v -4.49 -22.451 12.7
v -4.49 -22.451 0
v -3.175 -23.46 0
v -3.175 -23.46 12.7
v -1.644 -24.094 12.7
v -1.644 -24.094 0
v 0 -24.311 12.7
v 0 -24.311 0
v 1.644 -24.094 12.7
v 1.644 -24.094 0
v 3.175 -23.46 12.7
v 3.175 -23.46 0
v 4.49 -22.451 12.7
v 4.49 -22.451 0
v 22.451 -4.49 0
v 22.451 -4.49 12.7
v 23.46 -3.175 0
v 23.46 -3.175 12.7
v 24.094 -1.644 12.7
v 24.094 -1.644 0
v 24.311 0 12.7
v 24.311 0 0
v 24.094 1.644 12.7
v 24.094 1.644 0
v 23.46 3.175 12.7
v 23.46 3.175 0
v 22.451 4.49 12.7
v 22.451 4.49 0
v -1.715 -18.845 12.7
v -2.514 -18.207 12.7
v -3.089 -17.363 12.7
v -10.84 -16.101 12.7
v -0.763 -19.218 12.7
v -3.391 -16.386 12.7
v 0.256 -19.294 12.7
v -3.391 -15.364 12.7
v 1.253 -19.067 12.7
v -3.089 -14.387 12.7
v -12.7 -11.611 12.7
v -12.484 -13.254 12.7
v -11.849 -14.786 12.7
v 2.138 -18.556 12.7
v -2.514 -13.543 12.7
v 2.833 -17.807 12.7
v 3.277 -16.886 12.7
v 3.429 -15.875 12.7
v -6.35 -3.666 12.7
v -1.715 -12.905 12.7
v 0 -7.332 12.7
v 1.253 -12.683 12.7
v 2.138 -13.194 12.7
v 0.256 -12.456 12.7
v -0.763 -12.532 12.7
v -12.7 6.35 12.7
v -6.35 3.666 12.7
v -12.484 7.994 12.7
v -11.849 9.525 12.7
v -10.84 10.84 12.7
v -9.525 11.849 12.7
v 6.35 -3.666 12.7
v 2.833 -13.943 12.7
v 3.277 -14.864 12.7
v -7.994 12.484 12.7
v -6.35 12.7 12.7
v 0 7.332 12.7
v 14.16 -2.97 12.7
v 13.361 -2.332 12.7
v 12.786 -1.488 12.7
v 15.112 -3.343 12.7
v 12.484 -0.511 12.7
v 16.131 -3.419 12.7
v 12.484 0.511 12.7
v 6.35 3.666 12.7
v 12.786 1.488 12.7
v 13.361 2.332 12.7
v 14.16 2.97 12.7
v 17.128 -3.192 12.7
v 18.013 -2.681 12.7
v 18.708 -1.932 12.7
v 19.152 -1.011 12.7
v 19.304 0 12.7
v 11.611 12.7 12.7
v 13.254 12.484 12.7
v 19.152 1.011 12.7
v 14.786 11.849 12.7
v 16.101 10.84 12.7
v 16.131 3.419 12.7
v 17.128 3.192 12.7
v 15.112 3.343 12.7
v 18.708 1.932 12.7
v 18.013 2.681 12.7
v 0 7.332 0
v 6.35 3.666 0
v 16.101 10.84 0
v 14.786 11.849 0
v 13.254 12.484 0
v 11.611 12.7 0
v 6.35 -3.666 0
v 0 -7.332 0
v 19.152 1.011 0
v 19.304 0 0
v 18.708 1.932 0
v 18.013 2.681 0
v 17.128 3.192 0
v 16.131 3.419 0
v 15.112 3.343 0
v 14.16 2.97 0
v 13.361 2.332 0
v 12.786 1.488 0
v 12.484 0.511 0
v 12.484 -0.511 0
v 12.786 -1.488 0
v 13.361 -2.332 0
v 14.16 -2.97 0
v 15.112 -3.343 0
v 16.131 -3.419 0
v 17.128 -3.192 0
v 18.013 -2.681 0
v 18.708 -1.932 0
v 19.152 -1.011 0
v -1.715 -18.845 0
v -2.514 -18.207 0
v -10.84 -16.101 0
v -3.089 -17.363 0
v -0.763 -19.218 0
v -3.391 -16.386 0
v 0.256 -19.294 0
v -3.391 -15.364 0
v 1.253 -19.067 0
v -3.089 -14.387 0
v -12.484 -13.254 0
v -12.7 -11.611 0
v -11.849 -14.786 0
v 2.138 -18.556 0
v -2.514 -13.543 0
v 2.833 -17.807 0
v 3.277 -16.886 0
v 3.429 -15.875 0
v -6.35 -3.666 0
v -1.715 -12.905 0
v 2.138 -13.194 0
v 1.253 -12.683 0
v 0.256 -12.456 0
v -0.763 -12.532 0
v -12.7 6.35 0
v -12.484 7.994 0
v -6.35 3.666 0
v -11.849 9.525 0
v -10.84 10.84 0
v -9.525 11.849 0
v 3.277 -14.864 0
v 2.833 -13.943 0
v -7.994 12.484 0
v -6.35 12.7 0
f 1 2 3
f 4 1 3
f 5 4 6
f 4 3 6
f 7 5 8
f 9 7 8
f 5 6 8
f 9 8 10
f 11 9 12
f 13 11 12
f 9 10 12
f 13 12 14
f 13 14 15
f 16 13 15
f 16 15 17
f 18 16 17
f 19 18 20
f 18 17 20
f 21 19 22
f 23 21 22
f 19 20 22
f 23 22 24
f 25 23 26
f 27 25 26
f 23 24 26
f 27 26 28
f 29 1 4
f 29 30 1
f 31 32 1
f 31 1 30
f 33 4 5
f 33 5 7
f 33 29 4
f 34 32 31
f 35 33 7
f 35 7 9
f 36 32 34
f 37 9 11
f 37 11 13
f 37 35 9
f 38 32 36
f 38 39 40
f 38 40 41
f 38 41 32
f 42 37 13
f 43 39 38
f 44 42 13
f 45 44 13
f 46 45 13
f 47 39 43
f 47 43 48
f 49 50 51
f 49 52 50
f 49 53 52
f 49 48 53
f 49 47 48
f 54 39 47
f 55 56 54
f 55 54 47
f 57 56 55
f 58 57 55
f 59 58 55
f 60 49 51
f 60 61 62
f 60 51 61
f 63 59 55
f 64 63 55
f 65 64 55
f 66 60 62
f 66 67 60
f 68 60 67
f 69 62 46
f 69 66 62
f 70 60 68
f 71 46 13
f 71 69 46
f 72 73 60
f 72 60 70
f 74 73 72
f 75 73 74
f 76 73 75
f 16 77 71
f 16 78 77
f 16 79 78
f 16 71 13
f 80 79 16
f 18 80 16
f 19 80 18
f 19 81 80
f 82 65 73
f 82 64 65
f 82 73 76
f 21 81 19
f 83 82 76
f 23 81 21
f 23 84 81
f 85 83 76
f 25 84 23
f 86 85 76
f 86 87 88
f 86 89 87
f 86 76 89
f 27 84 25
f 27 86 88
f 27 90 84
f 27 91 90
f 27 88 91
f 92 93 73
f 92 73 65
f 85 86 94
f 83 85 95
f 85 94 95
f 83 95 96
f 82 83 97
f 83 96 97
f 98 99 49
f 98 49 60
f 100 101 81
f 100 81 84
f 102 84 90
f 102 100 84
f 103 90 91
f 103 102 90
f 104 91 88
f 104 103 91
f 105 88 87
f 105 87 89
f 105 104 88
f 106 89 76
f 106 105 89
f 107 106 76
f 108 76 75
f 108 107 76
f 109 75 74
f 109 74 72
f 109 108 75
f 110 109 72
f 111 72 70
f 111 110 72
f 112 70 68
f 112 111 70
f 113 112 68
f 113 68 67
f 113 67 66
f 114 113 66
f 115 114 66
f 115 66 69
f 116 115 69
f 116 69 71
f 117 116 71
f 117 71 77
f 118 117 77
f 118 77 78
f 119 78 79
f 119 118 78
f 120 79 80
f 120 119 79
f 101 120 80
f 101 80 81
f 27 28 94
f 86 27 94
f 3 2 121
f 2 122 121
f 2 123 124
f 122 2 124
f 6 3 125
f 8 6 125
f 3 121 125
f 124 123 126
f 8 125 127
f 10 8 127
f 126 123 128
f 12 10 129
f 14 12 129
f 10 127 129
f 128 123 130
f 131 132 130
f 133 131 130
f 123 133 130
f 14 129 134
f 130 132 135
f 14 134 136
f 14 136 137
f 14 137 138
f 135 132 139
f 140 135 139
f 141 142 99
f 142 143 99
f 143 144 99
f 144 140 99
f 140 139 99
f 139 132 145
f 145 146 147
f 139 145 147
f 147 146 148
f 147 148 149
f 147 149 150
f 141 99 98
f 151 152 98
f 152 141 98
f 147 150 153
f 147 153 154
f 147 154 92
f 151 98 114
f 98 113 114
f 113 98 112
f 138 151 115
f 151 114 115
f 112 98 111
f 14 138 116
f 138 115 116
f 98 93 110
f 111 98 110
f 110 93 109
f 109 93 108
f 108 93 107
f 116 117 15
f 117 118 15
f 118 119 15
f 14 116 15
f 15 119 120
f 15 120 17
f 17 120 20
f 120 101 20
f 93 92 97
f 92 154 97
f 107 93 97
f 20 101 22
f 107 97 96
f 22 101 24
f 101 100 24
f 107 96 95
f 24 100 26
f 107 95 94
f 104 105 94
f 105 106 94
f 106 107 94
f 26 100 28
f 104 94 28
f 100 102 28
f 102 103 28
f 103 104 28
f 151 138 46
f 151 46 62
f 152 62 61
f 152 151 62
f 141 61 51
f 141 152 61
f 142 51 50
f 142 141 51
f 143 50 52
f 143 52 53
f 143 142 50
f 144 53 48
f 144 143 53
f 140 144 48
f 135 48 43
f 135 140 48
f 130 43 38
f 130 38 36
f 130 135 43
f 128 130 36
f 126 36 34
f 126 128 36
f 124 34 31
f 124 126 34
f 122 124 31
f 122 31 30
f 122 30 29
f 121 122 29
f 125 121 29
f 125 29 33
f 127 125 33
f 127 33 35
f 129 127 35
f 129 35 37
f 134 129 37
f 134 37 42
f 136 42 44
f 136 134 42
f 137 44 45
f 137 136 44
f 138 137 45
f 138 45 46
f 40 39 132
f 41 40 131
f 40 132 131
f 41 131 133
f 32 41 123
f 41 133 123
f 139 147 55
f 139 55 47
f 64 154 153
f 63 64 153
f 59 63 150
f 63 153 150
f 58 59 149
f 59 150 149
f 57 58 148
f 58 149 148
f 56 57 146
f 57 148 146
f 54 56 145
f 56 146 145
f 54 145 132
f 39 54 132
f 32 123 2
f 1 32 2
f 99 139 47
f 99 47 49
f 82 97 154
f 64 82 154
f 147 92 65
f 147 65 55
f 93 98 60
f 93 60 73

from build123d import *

# Parameters (mm, degrees)
SKETCH2_R           = 3.429
BOSS_EXTRUDE1_DEPTH = 12.7


with BuildPart() as part:
    # Sketch2 → Boss-Extrude1 (new body)
    with BuildSketch(Plane.XY):
        with BuildLine():
            Line((-10.840128061, -16.100640303), (-4.490128061, -22.450640303))
            ThreePointArc((-4.490128061, -22.450640303), (0, -24.310512242), (4.490128061, -22.450640303))
            Line((4.490128061, -22.450640303), (22.450640303, -4.490128061))
            ThreePointArc((22.450640303, -4.490128061), (24.310512242, 0), (22.450640303, 4.490128061))
            Line((22.450640303, 4.490128061), (16.100640303, 10.840128061))
            ThreePointArc((16.100640303, 10.840128061), (14.040552038, 12.216635031), (11.610512242, 12.7))
            Line((11.610512242, 12.7), (-6.35, 12.7))
            ThreePointArc((-6.35, 12.7), (-10.840128061, 10.840128061), (-12.7, 6.35))
            Line((-12.7, 6.35), (-12.7, -11.610512242))
            ThreePointArc((-12.7, -11.610512242), (-12.216635031, -14.040552038), (-10.840128061, -16.100640303))
        make_face()
        with Locations((15.875, 0)):
            Circle(SKETCH2_R, mode=Mode.SUBTRACT)
        with Locations((0, -15.875)):
            Circle(SKETCH2_R, mode=Mode.SUBTRACT)
        Polygon((6.35, 3.666174209), (0, 7.332348419), (-6.35, 3.666174209), (-6.35, -3.666174209), (0, -7.332348419), (6.35, -3.666174209), align=None, mode=Mode.SUBTRACT)
    extrude(amount=BOSS_EXTRUDE1_DEPTH)


solid = part.part
